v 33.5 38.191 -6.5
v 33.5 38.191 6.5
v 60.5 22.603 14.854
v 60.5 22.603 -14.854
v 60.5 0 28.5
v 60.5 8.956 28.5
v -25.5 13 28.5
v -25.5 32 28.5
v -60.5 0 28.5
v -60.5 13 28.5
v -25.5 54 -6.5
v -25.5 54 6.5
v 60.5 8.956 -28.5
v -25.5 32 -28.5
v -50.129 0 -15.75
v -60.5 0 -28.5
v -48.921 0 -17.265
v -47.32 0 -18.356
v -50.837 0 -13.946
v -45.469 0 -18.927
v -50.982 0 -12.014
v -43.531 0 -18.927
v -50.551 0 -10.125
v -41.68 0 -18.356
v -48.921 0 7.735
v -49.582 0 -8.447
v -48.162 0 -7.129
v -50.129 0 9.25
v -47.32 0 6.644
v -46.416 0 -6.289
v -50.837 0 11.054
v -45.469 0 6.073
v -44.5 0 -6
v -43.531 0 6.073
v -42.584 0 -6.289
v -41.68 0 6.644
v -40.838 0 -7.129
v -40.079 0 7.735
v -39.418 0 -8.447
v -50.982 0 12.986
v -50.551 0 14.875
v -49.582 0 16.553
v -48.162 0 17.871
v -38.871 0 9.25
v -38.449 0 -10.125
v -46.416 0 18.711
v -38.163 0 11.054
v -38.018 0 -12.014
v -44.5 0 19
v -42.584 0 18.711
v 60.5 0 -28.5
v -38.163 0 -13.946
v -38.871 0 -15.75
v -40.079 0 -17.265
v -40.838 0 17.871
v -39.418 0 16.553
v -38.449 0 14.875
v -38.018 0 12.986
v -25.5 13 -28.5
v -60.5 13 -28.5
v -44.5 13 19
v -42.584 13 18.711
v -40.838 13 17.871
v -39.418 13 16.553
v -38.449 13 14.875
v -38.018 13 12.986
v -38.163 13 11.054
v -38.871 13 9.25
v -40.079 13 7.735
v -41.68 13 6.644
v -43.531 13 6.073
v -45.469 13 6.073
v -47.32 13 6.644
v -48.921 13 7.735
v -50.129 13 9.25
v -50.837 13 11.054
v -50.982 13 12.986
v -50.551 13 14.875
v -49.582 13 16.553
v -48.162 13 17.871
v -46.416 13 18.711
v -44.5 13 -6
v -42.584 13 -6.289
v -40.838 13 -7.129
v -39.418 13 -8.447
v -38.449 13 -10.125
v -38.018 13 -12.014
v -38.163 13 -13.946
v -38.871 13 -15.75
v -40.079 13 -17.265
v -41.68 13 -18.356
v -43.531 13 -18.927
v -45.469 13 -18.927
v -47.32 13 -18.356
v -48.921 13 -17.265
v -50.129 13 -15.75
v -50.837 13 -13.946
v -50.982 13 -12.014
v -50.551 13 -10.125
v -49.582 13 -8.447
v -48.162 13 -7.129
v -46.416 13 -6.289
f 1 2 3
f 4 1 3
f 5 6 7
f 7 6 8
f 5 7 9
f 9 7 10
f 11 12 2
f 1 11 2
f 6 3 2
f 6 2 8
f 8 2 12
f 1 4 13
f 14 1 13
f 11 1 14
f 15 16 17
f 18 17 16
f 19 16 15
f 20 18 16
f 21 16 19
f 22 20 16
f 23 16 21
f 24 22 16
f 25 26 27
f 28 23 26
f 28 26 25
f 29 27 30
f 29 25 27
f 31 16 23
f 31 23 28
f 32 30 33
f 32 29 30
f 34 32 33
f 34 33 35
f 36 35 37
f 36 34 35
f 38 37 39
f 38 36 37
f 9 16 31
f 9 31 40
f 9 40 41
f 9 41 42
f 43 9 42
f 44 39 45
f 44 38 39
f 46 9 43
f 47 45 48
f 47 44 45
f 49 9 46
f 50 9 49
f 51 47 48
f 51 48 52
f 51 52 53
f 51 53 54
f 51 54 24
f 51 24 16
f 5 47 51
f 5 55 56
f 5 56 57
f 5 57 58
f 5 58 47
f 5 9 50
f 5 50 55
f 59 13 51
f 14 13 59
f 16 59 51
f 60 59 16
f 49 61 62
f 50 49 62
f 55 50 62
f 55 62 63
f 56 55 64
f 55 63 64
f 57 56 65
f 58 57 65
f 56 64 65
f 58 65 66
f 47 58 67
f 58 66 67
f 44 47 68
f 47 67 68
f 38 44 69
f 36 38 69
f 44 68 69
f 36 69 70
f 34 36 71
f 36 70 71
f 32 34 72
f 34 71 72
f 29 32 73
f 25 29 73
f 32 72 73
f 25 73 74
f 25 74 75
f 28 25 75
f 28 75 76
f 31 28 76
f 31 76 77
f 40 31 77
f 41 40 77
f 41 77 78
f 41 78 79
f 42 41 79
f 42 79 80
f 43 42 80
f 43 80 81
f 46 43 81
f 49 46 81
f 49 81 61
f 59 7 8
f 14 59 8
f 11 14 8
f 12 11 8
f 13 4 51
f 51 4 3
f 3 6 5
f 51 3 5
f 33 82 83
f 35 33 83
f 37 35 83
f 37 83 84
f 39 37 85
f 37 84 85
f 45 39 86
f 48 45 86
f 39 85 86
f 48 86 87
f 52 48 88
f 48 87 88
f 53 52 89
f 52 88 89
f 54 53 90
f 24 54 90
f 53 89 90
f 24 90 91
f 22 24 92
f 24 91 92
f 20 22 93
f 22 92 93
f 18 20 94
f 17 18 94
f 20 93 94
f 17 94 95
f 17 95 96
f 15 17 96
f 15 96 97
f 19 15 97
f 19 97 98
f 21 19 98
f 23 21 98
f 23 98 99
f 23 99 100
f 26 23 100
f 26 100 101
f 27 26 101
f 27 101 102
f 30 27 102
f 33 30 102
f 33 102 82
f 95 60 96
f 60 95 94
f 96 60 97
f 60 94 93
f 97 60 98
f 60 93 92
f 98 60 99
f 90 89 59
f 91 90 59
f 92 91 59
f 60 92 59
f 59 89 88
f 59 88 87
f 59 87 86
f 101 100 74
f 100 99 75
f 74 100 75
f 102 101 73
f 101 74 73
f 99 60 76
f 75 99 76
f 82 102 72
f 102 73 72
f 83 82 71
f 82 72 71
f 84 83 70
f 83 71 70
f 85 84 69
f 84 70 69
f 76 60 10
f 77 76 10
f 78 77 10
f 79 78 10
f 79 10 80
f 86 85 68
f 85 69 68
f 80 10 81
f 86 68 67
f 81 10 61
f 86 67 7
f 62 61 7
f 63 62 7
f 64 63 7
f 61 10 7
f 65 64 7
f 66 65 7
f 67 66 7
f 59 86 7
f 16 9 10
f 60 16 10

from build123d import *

# Parameters (mm, degrees)
SKETCH1_W           = 121
SKETCH1_H           = 13
BOSS_EXTRUDE1_DEPTH = 28.5
SKETCH2_R           = 6.5
CUT_EXTRUDE1_DEPTH  = 69.128554953
BOSS_EXTRUDE2_DEPTH = 57
CUT_EXTRUDE3_REACH  = 93.09
CUT_EXTRUDE4_REACH  = 93.09


with BuildPart() as part:
    # Sketch1 → Boss-Extrude1 (new, symmetric)
    with BuildSketch(Plane.XY):
        with Locations((0, 6.5)):
            Rectangle(SKETCH1_W, SKETCH1_H)
    extrude(amount=BOSS_EXTRUDE1_DEPTH, both=True)

    # Sketch2 → Cut-Extrude1 (cut, through all)
    with BuildSketch(Plane(origin=(0, 13, 0), x_dir=(1, 0, 0), z_dir=(0, 1, 0))):
        with Locations(Location((-44.5, 12.5, 0), (0, 0, 270))):
            Circle(SKETCH2_R)
        with Locations(Location((-44.5, -12.5, 0), (0, 0, 270))):
            Circle(SKETCH2_R)
    extrude(amount=-CUT_EXTRUDE1_DEPTH, mode=Mode.SUBTRACT)

    # Sketch3 → Boss-Extrude2 (add)
    with BuildSketch(Plane.XY.offset(28.5)):
        Polygon((-25.5, 13), (-25.5, 54), (33.5, 38.190997647), (60.5, 22.602540378), (60.5, 13), align=None)
    extrude(amount=-BOSS_EXTRUDE2_DEPTH)

    # Sketch7 → Cut-Extrude3 (cut, up to next)
    with BuildSketch(Plane(origin=(6.940887603, 25.903745183, 25.903745183), x_dir=(0.9825200508486979, -0.13163272708614732, -0.13163272708614732), z_dir=(0.1861567878973858, 0.6947465906068656, 0.6947465906068659)), mode=Mode.PRIVATE) as cut_extrude3_sk1:
        Polygon((-40.951405202, -0.627191909), (-40.951405202, 40.505985035), (61.941772905, 20.980207657), (61.941772905, -20.152969287), align=None)
    cut_extrude3_tool1 = extrude(cut_extrude3_sk1.sketch, amount=CUT_EXTRUDE3_REACH, mode=Mode.PRIVATE) & part.part
    add(cut_extrude3_tool1.solids().sort_by_distance((17.252616, 31.718113, 17.326358))[0], mode=Mode.SUBTRACT)

    # Sketch10 → Cut-Extrude4 (cut, up to next)
    with BuildSketch(Plane(origin=(6.940887603, 25.903745183, -25.903745183), x_dir=(-0.9825200508486979, 0.13163272708614734, -0.13163272708614734), z_dir=(0.18615678789738585, 0.6947465906068656, -0.6947465906068659)), mode=Mode.PRIVATE) as cut_extrude4_sk1:
        Polygon((44.988619568, 4.703278136), (44.988619568, 35.815976509), (-66.918136798, 14.9837742), (-66.918136798, -16.128924173), align=None)
    cut_extrude4_tool1 = extrude(cut_extrude4_sk1.sketch, amount=CUT_EXTRUDE4_REACH, mode=Mode.PRIVATE) & part.part
    add(cut_extrude4_tool1.solids().sort_by_distance((17.713983, 31.420848, -17.5))[0], mode=Mode.SUBTRACT)


solid = part.part
